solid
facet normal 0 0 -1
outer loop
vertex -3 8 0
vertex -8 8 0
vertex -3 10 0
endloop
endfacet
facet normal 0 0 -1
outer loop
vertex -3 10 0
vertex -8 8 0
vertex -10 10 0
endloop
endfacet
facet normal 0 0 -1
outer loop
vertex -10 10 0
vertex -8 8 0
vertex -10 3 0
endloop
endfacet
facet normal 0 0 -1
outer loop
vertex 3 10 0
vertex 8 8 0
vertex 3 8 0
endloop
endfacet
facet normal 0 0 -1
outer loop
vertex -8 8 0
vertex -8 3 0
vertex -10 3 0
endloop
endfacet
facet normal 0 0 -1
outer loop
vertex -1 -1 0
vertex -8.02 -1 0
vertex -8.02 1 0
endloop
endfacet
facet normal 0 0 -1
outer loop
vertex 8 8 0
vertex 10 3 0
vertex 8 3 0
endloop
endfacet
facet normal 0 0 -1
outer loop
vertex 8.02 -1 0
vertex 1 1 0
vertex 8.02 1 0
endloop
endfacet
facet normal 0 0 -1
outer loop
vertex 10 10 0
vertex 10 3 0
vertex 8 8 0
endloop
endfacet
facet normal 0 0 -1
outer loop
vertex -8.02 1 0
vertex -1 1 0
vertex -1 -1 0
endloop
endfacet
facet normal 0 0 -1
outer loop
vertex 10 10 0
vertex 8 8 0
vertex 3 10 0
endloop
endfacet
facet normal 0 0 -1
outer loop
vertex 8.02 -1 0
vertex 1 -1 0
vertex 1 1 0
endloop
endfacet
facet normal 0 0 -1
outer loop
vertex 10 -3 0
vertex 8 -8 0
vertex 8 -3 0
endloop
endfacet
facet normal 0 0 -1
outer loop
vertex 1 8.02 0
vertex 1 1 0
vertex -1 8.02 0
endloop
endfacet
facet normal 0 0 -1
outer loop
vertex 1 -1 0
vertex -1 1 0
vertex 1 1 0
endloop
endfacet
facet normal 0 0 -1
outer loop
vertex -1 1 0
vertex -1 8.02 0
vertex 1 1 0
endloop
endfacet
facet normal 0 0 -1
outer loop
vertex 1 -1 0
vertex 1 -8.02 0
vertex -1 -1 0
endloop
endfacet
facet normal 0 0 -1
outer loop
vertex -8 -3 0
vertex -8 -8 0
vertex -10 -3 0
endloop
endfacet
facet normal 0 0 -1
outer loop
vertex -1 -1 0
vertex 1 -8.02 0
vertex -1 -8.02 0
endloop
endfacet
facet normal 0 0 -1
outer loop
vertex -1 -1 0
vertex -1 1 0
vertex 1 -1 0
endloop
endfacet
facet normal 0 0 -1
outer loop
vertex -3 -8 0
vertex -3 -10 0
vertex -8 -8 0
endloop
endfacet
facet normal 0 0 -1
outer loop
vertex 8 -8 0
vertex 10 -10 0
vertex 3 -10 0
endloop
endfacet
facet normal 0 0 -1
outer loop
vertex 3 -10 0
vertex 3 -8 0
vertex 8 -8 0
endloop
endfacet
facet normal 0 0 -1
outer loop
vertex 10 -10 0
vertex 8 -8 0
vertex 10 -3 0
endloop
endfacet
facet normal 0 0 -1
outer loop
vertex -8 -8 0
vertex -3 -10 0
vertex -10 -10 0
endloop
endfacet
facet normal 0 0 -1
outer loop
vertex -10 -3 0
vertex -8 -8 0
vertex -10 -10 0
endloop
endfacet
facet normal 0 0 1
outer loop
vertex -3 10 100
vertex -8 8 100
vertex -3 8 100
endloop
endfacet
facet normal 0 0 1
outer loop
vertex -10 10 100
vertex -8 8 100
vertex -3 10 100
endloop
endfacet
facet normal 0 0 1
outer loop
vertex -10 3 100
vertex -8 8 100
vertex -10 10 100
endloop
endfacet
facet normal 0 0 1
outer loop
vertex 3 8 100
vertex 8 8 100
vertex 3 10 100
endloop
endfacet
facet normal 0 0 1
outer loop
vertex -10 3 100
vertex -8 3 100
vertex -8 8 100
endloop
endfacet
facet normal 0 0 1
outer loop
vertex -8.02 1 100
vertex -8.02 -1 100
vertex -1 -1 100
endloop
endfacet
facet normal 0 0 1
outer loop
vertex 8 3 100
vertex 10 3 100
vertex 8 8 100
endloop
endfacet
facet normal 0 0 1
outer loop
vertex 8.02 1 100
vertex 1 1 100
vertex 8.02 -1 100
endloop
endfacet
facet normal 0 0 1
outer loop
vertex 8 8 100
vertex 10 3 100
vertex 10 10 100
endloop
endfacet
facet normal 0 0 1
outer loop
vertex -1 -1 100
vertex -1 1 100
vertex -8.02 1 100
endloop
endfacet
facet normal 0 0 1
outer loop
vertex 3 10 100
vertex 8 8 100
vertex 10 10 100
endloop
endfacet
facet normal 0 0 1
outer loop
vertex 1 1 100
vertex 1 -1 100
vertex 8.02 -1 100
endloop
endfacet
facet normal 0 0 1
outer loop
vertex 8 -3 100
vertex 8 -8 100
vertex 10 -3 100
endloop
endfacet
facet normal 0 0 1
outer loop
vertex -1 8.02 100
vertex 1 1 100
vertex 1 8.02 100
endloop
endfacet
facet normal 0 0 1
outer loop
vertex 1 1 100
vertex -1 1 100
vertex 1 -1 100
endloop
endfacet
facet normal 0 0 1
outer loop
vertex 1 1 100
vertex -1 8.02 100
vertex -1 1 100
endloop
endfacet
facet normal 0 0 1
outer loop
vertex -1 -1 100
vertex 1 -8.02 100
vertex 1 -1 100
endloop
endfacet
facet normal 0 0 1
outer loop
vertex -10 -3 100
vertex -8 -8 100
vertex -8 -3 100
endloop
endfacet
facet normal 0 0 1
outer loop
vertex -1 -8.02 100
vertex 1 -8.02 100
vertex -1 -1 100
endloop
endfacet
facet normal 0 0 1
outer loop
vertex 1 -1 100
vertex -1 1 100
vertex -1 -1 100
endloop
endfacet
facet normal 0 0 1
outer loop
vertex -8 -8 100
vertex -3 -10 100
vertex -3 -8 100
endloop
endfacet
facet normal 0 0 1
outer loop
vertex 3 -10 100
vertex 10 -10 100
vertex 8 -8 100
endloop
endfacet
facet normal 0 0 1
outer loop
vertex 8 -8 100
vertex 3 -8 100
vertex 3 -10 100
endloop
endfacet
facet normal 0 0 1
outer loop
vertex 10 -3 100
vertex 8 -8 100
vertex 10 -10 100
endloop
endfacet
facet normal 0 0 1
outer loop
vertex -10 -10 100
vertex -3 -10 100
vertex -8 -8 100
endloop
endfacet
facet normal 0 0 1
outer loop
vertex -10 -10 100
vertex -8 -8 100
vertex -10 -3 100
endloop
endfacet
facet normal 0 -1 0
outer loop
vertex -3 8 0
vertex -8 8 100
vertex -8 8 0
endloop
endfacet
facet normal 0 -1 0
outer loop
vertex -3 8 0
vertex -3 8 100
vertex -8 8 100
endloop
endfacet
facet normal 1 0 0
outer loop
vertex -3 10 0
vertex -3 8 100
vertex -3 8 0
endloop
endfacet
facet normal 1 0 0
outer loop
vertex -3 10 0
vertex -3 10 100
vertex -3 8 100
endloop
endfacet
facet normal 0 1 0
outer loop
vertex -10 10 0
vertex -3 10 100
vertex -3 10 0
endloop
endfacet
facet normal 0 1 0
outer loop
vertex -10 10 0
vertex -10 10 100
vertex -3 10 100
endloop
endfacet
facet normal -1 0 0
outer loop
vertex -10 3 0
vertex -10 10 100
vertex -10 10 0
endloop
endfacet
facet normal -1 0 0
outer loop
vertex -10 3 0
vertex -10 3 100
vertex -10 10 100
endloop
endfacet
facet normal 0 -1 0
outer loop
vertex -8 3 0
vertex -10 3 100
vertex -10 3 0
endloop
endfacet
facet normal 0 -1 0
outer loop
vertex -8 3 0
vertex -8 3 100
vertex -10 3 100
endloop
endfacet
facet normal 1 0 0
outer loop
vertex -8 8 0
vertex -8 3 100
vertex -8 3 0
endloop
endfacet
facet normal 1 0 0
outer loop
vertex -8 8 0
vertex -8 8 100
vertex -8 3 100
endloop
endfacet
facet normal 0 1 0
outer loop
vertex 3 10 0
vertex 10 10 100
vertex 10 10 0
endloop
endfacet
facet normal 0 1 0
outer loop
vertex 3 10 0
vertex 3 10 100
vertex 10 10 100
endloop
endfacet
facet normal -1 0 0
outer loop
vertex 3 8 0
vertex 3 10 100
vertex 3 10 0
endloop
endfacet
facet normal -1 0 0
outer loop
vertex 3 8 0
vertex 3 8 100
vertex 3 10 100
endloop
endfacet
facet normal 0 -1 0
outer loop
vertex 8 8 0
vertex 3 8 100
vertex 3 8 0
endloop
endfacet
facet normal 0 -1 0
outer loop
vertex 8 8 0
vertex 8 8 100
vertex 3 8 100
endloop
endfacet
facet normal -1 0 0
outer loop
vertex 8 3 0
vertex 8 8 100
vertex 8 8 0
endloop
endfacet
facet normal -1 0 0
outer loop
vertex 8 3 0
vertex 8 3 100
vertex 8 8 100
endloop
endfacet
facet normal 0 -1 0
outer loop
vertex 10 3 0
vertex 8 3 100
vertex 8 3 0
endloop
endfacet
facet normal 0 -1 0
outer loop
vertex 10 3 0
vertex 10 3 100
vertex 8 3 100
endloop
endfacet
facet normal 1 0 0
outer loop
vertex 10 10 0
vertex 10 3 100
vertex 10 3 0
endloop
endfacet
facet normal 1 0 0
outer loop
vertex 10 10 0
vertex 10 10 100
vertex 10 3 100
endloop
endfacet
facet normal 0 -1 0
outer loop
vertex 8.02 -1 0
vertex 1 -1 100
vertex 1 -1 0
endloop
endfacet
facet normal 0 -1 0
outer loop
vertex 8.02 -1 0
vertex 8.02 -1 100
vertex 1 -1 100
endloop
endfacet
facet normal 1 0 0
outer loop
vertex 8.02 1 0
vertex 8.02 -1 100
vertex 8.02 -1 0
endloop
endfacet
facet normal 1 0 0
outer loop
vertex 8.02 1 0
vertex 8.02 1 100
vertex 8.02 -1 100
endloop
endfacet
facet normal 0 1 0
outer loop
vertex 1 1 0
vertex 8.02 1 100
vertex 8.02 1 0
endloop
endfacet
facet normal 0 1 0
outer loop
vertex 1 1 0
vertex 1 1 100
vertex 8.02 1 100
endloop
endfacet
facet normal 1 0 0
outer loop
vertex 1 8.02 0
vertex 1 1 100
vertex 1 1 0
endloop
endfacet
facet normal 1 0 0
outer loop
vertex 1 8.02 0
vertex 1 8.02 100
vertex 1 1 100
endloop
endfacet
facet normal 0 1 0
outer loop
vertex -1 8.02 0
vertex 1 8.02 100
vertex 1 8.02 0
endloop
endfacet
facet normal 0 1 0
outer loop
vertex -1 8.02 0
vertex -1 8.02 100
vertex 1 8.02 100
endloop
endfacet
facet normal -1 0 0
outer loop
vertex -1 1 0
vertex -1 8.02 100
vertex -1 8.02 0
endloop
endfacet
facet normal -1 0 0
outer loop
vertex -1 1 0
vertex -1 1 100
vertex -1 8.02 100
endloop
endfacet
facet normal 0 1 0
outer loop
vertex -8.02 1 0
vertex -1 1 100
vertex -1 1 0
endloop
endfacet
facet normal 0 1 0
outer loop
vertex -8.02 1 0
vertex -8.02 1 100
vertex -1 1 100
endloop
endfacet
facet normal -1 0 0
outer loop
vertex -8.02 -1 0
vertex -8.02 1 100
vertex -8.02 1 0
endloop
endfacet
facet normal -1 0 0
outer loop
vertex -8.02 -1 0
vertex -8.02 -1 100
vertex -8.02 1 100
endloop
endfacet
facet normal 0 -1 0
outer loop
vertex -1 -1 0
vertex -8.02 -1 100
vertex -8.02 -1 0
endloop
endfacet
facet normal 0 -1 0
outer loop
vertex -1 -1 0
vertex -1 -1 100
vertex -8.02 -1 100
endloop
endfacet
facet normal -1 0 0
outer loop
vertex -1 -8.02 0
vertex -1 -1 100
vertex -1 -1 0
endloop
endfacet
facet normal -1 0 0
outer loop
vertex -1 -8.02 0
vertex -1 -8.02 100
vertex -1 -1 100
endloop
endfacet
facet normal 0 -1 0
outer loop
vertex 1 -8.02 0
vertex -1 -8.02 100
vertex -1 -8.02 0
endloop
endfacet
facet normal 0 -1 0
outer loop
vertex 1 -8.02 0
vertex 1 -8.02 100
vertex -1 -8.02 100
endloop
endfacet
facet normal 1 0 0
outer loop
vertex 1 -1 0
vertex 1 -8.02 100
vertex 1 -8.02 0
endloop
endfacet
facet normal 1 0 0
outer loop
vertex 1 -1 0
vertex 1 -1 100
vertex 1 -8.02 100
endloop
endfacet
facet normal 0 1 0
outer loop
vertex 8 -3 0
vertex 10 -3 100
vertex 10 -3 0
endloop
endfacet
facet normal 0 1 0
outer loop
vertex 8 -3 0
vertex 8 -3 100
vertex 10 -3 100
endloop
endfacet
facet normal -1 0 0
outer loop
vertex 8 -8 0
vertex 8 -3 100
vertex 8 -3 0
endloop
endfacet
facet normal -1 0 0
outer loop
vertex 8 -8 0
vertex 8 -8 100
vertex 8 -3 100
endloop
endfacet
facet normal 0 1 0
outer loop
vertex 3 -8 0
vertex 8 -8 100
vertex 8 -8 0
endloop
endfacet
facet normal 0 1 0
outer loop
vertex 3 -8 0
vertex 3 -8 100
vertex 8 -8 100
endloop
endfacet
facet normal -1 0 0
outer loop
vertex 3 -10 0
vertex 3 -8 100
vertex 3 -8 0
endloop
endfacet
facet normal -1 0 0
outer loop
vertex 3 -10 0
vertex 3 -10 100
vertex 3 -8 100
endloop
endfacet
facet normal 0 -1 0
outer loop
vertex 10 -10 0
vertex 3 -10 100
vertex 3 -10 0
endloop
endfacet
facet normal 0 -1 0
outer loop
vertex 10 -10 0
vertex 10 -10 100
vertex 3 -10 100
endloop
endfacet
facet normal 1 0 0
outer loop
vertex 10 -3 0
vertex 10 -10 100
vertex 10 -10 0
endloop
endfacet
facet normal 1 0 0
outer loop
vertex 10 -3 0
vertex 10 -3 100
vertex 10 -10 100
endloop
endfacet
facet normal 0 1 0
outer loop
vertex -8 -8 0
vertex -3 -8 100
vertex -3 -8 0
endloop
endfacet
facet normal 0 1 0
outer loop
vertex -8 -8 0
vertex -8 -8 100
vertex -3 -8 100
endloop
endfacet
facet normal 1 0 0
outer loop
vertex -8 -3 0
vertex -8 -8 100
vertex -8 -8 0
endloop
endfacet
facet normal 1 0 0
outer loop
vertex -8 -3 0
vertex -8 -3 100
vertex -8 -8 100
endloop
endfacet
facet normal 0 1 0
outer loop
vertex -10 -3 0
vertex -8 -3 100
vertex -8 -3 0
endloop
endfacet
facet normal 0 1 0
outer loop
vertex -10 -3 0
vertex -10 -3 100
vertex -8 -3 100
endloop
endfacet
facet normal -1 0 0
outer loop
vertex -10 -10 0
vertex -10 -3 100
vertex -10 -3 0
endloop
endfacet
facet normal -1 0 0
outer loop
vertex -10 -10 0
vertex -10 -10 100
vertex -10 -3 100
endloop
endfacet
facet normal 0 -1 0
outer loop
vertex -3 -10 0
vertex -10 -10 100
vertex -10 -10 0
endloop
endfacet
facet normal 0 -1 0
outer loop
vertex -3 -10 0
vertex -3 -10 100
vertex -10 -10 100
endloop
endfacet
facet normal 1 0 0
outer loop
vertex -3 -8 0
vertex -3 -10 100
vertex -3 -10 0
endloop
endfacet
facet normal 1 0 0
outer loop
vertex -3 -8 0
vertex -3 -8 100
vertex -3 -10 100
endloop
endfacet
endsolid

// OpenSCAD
$fn = 64;

// 20x20 aluminium extrusion-like profile (T-slot style), 100mm long
// Extrusion runs along Z so side views show the 100mm length.

module extrusion_2020(size=20, length=100, wall=2, slot_w=6, slot_depth=4, web=2, bore_d=5) {
    outer = size;
    half  = outer/2;

    // Keep parameters sane
    inner = max(outer - 2*wall, 0.1);
    slot_len = max(slot_depth, 0.1);
    web_w = max(web, 0.1);

    // Small overlap to avoid coincident faces (keeps one connected solid)
    eps = 0.02;

    linear_extrude(height=length, center=false, convexity=10)
        union() {
            // Outer shell with cavity, slots, and bore removed
            difference() {
                square([outer, outer], center=true);

                // Inner cavity
                square([inner, inner], center=true);

                // Four face slots (open to outside)
                translate([ half - slot_len/2 + eps, 0])
                    square([slot_len + 2*eps, slot_w], center=true);
                translate([-half + slot_len/2 - eps, 0])
                    square([slot_len + 2*eps, slot_w], center=true);
                translate([0,  half - slot_len/2 + eps])
                    square([slot_w, slot_len + 2*eps], center=true);
                translate([0, -half + slot_len/2 - eps])
                    square([slot_w, slot_len + 2*eps], center=true);

                // Center bore
                circle(d=bore_d);
            }

            // Internal webs (solid), slightly oversized to guarantee connection to shell
            square([inner + 2*eps, web_w], center=true);
            square([web_w, inner + 2*eps], center=true);
        }
}

extrusion_2020(size=20, length=100, wall=2, slot_w=6, slot_depth=4, web=2, bore_d=5);
